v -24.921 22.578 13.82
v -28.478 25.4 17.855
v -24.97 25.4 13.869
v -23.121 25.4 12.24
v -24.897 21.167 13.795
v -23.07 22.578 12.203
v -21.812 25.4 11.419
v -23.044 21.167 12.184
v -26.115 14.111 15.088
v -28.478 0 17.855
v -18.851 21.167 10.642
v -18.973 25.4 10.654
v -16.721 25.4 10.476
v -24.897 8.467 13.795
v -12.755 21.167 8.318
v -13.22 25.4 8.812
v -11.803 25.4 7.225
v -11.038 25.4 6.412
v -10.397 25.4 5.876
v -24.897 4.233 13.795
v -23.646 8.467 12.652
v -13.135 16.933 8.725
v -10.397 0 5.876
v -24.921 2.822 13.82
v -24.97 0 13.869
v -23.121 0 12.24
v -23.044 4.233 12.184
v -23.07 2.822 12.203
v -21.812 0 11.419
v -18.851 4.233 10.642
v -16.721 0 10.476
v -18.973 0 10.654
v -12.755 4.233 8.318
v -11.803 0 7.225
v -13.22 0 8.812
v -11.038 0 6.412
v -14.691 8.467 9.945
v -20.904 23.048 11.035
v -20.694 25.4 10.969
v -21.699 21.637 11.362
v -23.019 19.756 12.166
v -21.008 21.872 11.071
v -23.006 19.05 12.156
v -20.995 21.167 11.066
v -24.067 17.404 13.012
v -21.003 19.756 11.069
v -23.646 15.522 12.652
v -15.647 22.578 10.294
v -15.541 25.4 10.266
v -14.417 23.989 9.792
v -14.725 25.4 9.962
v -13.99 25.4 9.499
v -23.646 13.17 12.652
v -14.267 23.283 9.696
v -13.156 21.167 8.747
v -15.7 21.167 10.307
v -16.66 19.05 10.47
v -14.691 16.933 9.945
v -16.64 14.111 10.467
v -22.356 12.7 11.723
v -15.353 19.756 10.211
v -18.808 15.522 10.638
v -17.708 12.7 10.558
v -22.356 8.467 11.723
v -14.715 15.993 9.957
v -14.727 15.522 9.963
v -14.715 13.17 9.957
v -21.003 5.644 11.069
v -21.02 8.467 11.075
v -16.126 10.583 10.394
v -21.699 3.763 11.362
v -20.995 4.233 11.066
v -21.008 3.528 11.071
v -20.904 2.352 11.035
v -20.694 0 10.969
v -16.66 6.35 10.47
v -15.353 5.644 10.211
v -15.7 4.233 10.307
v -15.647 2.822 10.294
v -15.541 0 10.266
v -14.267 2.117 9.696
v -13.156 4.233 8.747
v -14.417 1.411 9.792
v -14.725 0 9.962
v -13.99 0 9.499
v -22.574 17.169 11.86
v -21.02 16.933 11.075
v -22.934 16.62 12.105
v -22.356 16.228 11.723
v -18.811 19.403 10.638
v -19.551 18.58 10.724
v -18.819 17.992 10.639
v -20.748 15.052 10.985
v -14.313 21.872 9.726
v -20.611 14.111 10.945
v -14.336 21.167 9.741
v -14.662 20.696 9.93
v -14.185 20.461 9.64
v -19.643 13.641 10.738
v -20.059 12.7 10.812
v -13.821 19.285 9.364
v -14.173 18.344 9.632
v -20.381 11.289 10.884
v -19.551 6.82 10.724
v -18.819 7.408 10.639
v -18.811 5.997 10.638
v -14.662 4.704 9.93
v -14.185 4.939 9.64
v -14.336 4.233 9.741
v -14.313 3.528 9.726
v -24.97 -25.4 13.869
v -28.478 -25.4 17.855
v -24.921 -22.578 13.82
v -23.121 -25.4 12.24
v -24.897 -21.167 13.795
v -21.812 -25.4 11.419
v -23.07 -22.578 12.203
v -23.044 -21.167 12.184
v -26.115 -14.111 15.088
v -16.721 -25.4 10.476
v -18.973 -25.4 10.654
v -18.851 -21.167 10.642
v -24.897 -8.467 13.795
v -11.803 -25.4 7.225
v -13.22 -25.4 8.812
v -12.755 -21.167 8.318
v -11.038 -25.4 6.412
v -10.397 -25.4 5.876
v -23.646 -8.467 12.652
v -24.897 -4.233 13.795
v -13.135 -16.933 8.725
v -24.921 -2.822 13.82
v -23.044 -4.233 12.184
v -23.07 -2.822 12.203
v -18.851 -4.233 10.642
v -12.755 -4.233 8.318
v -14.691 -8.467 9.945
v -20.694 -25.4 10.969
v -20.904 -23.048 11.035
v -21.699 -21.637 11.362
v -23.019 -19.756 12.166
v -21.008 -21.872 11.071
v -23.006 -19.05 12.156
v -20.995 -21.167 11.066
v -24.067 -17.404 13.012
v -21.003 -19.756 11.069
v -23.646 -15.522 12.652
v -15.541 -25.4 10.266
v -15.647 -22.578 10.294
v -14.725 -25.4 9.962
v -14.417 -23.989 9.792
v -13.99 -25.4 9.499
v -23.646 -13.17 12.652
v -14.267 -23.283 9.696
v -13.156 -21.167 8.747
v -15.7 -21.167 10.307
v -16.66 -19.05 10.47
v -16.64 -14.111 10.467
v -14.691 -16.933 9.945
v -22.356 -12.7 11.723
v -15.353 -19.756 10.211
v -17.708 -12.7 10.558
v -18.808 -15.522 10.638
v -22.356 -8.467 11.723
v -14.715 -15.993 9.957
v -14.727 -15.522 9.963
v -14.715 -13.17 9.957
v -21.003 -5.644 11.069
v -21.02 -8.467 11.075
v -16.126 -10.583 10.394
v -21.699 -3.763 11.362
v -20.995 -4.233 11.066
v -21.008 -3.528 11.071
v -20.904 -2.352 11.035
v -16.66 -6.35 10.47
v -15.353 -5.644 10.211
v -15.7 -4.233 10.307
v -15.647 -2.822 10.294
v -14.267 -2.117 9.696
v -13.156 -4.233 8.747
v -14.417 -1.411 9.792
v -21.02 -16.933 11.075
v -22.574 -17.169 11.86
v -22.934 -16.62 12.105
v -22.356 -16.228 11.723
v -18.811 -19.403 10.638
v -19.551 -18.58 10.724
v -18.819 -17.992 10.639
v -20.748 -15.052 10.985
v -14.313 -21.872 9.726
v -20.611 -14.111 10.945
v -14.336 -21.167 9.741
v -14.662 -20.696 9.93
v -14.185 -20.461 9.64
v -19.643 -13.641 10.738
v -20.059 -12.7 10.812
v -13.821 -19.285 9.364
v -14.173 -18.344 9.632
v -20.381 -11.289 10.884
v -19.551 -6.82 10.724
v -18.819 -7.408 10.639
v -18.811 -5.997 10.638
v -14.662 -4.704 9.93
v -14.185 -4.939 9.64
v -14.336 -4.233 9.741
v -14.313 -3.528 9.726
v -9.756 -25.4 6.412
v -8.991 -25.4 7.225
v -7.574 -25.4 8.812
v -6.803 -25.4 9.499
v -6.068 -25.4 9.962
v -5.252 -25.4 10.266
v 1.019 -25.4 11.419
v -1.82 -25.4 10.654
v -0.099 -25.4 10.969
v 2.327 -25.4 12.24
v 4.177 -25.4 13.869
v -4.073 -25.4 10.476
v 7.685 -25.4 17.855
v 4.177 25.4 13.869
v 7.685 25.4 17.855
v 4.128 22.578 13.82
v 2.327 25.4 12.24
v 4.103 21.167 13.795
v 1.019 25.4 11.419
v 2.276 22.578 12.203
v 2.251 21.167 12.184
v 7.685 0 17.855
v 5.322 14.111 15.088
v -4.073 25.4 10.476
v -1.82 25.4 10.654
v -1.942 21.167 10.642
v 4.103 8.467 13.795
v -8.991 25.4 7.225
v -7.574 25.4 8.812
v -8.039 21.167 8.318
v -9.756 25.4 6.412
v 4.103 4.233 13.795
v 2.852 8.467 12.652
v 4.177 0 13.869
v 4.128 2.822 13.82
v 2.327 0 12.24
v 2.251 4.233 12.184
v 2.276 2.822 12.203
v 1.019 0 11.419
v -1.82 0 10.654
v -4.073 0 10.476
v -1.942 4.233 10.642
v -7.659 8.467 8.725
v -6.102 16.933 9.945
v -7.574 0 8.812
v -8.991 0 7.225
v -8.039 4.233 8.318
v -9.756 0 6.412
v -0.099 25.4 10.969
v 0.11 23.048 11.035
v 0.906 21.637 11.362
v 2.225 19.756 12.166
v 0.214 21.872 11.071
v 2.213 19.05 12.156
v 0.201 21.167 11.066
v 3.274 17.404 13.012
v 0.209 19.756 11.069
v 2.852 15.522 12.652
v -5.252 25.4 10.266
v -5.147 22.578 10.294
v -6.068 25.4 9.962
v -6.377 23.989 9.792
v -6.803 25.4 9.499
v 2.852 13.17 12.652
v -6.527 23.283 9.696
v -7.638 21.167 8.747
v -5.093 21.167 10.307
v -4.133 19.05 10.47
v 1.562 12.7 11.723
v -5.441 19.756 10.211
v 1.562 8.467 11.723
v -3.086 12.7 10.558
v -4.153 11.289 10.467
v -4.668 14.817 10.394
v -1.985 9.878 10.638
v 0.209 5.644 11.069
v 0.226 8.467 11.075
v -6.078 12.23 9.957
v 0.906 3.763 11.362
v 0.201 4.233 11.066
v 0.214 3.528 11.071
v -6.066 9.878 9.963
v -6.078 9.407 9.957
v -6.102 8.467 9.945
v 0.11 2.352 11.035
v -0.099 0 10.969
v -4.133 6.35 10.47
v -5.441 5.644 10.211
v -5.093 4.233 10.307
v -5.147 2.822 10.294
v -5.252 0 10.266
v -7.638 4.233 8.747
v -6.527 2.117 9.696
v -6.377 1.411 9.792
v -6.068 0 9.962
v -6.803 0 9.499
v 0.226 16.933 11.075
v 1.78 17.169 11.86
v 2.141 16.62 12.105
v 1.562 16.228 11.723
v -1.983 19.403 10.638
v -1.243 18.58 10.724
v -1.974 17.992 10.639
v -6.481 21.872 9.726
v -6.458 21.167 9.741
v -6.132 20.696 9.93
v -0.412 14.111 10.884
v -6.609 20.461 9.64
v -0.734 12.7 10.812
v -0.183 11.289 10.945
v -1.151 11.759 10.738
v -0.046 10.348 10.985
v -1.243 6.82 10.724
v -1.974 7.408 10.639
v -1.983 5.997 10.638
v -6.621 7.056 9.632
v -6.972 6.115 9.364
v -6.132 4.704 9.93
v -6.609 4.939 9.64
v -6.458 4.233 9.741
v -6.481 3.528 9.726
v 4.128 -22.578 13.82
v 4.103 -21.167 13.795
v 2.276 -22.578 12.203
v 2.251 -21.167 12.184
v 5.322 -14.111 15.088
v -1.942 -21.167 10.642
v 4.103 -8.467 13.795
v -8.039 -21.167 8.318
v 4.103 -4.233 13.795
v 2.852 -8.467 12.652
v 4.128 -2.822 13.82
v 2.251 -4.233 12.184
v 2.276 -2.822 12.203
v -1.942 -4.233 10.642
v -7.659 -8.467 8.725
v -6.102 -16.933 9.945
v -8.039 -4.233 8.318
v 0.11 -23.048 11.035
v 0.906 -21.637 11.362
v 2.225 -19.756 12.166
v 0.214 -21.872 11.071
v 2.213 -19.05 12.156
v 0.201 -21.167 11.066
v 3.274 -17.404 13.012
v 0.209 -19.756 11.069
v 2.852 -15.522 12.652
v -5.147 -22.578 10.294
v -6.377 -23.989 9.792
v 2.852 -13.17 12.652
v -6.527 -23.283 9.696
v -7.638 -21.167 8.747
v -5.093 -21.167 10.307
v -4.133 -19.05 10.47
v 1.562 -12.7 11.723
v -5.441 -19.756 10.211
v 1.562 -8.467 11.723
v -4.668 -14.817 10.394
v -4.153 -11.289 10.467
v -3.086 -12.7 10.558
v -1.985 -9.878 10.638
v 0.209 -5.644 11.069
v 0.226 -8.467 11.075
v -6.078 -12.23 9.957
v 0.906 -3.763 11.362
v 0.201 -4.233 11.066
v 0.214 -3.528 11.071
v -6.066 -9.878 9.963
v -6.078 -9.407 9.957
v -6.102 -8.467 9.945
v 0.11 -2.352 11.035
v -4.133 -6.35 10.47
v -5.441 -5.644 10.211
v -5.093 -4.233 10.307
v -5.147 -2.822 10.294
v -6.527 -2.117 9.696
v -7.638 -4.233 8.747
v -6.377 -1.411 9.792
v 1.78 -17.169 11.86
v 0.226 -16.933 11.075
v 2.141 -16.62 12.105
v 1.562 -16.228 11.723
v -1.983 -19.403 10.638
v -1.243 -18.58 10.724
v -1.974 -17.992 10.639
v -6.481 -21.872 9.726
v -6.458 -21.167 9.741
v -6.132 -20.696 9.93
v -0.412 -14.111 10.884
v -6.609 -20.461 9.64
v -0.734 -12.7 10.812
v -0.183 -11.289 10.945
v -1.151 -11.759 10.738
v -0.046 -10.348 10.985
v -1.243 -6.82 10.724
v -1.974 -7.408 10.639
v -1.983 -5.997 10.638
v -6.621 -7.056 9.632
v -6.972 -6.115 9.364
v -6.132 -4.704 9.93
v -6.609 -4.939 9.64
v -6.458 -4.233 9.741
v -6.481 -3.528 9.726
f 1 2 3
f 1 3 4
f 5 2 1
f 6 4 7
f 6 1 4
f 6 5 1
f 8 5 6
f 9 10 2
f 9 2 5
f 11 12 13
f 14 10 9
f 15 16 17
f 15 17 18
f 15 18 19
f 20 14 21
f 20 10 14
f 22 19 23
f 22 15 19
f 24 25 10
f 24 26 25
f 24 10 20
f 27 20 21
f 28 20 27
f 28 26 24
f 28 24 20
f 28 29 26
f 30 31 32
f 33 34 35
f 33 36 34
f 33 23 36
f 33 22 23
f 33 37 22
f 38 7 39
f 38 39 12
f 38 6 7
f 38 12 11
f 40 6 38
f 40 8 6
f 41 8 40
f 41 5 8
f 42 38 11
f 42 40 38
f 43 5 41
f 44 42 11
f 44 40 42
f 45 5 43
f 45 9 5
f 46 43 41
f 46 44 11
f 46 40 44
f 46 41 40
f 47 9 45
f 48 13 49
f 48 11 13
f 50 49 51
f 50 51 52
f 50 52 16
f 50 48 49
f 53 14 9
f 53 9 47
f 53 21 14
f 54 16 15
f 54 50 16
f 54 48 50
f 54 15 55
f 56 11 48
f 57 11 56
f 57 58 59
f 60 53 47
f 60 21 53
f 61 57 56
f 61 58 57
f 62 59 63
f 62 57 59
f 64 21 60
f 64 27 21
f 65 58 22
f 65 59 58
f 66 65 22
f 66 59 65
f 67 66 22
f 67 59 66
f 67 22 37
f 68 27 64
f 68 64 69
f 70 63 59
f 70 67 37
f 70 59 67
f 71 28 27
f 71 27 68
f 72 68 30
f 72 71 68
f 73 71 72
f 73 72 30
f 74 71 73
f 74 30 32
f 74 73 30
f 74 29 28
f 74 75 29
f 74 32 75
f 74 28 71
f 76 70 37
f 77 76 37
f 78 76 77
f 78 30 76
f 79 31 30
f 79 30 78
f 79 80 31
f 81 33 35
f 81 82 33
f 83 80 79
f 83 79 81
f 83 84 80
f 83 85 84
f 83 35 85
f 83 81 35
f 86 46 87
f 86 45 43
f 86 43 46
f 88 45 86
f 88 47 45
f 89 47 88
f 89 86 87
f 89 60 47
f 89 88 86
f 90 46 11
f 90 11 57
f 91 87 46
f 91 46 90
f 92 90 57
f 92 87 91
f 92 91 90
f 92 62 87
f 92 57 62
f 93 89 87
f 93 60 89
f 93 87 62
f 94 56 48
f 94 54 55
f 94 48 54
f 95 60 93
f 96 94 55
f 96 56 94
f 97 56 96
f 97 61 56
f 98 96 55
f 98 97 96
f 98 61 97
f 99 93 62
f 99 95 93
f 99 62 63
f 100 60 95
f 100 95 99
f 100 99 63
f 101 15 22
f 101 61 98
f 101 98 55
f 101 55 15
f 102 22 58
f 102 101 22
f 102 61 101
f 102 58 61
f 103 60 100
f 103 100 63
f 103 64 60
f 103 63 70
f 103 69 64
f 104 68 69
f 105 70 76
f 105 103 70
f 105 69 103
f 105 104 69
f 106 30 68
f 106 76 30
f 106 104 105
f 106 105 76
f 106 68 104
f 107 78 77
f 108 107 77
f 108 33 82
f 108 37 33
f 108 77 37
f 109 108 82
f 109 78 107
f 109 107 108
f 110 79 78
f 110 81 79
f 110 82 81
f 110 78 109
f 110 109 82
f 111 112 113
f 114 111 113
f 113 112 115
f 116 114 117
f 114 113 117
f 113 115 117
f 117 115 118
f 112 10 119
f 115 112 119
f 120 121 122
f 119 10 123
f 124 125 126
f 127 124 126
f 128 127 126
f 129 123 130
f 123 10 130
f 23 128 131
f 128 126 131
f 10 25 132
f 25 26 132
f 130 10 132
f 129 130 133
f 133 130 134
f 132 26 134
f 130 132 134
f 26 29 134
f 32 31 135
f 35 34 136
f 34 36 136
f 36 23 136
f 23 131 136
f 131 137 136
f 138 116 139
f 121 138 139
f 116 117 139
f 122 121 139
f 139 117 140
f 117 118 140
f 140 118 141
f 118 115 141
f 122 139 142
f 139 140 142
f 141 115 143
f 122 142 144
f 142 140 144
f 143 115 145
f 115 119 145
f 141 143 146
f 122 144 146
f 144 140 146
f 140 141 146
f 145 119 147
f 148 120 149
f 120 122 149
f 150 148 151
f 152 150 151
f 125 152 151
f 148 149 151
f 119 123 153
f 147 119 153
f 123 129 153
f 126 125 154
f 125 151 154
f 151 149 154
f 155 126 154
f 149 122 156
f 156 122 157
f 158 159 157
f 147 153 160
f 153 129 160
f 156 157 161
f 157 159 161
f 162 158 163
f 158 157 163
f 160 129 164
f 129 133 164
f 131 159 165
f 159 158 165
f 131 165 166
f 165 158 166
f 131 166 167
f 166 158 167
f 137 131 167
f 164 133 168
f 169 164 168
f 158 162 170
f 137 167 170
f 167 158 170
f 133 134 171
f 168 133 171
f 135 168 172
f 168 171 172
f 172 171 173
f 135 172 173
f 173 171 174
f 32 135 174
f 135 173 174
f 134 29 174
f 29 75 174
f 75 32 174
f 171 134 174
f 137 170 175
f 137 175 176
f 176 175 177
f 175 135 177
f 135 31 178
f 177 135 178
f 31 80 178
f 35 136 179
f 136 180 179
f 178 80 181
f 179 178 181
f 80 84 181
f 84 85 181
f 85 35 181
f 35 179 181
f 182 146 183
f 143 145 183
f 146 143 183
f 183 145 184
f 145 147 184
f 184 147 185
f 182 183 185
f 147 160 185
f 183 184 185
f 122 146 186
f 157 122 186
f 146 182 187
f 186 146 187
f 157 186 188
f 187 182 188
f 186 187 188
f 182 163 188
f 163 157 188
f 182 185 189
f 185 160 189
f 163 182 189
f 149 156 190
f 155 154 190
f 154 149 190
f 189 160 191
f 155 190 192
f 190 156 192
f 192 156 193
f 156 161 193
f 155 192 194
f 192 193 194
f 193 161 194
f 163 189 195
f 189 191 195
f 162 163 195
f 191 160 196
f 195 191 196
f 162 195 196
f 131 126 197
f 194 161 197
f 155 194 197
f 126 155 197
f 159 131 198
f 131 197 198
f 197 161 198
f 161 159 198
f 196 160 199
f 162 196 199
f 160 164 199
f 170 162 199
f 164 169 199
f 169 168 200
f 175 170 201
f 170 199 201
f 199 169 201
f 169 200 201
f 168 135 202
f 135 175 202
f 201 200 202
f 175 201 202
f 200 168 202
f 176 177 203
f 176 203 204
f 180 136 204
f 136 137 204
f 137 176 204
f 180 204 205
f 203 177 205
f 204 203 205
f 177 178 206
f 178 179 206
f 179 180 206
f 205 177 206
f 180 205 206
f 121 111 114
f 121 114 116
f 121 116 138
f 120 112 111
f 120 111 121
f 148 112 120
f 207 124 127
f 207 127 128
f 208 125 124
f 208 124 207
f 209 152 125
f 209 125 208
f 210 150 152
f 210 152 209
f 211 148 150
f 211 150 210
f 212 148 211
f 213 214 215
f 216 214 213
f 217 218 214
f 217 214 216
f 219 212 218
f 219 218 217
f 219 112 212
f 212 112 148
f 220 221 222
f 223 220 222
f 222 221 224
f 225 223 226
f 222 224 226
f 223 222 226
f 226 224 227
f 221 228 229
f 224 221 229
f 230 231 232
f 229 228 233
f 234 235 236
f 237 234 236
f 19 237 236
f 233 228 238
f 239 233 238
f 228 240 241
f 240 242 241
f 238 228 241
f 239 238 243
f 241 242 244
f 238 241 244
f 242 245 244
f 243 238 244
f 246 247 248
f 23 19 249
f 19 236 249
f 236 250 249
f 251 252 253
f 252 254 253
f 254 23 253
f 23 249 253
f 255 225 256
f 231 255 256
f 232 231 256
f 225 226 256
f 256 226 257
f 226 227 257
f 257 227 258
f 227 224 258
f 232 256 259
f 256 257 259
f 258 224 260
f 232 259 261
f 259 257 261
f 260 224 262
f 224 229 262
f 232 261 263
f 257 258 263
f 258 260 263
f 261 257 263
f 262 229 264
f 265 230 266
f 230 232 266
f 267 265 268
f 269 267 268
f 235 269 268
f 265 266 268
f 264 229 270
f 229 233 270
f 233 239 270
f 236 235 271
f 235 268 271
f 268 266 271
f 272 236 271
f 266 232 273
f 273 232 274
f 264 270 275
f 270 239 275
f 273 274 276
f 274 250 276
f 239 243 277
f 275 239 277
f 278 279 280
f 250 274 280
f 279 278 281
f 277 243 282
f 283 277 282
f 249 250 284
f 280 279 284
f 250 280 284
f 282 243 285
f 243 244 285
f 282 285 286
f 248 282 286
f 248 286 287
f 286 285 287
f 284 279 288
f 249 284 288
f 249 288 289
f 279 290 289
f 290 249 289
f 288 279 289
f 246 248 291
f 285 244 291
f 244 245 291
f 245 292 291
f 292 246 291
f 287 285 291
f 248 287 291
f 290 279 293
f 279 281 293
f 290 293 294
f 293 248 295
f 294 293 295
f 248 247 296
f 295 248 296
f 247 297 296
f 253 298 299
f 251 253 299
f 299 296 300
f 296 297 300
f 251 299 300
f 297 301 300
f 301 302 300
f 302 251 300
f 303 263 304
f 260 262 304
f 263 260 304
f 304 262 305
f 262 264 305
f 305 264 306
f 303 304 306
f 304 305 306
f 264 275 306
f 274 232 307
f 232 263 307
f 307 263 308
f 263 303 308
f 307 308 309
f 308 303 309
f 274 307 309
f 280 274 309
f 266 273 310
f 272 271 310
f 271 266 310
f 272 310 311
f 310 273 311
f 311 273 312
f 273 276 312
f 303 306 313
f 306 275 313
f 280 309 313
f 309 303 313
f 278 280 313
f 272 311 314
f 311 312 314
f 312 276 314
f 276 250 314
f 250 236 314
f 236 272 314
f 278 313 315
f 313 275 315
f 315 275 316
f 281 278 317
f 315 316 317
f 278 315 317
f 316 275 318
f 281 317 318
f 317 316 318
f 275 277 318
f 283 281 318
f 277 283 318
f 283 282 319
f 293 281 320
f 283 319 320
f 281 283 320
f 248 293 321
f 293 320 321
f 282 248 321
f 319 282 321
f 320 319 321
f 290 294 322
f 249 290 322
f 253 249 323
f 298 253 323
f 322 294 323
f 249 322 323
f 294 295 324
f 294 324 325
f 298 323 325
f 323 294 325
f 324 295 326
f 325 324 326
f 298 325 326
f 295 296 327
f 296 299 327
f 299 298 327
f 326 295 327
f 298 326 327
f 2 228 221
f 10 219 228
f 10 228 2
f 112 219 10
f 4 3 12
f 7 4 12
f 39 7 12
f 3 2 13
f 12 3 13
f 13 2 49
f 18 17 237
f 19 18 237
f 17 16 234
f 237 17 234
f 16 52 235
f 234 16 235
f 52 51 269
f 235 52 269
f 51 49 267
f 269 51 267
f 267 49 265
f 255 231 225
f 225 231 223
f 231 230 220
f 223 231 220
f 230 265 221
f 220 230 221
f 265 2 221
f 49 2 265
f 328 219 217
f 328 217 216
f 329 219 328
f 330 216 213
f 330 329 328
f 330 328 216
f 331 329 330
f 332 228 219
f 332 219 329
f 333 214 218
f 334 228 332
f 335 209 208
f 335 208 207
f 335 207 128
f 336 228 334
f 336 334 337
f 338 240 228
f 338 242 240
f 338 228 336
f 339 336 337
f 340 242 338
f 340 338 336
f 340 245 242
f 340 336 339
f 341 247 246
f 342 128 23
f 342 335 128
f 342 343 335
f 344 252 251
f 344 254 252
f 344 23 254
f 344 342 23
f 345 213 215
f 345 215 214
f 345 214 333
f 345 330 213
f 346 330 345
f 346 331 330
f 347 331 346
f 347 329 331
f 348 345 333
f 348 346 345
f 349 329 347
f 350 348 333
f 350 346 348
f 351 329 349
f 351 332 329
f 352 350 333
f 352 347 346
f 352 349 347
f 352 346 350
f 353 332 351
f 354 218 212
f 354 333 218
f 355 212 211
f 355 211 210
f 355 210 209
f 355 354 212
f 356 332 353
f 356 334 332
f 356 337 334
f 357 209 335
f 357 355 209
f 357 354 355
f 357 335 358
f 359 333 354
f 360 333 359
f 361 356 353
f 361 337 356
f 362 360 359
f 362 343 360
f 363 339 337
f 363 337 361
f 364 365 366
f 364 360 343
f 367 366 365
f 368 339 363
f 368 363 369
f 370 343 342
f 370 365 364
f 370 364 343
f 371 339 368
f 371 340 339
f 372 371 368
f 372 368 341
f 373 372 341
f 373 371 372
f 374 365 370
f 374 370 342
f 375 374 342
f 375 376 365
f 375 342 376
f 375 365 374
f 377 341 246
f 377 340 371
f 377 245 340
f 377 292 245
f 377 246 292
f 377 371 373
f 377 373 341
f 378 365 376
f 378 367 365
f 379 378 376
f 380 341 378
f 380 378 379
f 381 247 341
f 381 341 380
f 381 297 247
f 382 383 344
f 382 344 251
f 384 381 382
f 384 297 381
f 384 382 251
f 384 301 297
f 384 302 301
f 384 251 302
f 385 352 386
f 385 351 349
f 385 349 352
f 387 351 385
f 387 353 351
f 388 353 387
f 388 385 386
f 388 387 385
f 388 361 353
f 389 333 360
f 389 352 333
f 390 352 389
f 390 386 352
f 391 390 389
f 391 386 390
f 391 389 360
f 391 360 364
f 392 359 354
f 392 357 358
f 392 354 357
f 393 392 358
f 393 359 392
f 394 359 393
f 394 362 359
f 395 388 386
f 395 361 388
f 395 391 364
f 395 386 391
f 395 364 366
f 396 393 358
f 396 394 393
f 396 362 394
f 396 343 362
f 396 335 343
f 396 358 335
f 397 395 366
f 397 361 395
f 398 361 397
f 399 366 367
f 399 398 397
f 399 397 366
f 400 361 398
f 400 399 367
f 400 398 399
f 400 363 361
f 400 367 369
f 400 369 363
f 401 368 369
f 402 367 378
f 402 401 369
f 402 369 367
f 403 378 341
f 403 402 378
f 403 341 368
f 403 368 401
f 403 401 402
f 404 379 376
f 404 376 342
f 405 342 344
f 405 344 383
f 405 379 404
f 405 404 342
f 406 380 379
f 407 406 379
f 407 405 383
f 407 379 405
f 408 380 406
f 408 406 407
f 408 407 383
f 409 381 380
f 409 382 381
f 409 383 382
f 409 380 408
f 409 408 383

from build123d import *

# Parameters (mm, degrees)
F1_DEPTH      = 25.4
F1_DEPTH_BACK = 25.4


with BuildPart() as f1:
    # F0 (on Front) → F1 (new body, two sides)
    with BuildSketch(Plane.XZ) as f1_sk:
        with BuildLine():
            Line((-10.3967804462, 17.8553387523), (-28.4781362861, 17.8553387523))
            add(Edge.make_bspline(
                [(-28.4781362861, 17.8553387523), (-26.151010961, 15.0979154646), (-21.8178408804, 9.6096851294), (-14.1950475719, 11.3771317015), (-11.8199229442, 6.8708596616), (-10.3967804462, 5.8764405549)],
                knots=[0, 0, 0, 0, 0.3899151773, 0.7013007932, 1, 1, 1, 1], degree=3))
            Line((-10.3967804462, 5.8764405549), (-10.3967804462, 17.8553387523))
        make_face()
        with BuildLine():
            Line((-10.3967804462, 17.8553387523), (-10.3967804462, 5.8764405549))
            add(Edge.make_bspline(
                [(7.6845753938, 17.8553387523), (5.3574500686, 15.0979154646), (1.0242799881, 9.6096851294), (-6.5985133204, 11.3771317015), (-8.9736379481, 6.8708596616), (-10.3967804462, 5.8764405549)],
                knots=[0, 0, 0, 0, 0.3899151773, 0.7013007932, 1, 1, 1, 1], degree=3))
            Line((7.6845753938, 17.8553387523), (-10.3967804462, 17.8553387523))
        make_face()
    extrude(amount=F1_DEPTH)
    extrude(f1_sk.sketch, amount=-F1_DEPTH_BACK)


solid = f1.part
